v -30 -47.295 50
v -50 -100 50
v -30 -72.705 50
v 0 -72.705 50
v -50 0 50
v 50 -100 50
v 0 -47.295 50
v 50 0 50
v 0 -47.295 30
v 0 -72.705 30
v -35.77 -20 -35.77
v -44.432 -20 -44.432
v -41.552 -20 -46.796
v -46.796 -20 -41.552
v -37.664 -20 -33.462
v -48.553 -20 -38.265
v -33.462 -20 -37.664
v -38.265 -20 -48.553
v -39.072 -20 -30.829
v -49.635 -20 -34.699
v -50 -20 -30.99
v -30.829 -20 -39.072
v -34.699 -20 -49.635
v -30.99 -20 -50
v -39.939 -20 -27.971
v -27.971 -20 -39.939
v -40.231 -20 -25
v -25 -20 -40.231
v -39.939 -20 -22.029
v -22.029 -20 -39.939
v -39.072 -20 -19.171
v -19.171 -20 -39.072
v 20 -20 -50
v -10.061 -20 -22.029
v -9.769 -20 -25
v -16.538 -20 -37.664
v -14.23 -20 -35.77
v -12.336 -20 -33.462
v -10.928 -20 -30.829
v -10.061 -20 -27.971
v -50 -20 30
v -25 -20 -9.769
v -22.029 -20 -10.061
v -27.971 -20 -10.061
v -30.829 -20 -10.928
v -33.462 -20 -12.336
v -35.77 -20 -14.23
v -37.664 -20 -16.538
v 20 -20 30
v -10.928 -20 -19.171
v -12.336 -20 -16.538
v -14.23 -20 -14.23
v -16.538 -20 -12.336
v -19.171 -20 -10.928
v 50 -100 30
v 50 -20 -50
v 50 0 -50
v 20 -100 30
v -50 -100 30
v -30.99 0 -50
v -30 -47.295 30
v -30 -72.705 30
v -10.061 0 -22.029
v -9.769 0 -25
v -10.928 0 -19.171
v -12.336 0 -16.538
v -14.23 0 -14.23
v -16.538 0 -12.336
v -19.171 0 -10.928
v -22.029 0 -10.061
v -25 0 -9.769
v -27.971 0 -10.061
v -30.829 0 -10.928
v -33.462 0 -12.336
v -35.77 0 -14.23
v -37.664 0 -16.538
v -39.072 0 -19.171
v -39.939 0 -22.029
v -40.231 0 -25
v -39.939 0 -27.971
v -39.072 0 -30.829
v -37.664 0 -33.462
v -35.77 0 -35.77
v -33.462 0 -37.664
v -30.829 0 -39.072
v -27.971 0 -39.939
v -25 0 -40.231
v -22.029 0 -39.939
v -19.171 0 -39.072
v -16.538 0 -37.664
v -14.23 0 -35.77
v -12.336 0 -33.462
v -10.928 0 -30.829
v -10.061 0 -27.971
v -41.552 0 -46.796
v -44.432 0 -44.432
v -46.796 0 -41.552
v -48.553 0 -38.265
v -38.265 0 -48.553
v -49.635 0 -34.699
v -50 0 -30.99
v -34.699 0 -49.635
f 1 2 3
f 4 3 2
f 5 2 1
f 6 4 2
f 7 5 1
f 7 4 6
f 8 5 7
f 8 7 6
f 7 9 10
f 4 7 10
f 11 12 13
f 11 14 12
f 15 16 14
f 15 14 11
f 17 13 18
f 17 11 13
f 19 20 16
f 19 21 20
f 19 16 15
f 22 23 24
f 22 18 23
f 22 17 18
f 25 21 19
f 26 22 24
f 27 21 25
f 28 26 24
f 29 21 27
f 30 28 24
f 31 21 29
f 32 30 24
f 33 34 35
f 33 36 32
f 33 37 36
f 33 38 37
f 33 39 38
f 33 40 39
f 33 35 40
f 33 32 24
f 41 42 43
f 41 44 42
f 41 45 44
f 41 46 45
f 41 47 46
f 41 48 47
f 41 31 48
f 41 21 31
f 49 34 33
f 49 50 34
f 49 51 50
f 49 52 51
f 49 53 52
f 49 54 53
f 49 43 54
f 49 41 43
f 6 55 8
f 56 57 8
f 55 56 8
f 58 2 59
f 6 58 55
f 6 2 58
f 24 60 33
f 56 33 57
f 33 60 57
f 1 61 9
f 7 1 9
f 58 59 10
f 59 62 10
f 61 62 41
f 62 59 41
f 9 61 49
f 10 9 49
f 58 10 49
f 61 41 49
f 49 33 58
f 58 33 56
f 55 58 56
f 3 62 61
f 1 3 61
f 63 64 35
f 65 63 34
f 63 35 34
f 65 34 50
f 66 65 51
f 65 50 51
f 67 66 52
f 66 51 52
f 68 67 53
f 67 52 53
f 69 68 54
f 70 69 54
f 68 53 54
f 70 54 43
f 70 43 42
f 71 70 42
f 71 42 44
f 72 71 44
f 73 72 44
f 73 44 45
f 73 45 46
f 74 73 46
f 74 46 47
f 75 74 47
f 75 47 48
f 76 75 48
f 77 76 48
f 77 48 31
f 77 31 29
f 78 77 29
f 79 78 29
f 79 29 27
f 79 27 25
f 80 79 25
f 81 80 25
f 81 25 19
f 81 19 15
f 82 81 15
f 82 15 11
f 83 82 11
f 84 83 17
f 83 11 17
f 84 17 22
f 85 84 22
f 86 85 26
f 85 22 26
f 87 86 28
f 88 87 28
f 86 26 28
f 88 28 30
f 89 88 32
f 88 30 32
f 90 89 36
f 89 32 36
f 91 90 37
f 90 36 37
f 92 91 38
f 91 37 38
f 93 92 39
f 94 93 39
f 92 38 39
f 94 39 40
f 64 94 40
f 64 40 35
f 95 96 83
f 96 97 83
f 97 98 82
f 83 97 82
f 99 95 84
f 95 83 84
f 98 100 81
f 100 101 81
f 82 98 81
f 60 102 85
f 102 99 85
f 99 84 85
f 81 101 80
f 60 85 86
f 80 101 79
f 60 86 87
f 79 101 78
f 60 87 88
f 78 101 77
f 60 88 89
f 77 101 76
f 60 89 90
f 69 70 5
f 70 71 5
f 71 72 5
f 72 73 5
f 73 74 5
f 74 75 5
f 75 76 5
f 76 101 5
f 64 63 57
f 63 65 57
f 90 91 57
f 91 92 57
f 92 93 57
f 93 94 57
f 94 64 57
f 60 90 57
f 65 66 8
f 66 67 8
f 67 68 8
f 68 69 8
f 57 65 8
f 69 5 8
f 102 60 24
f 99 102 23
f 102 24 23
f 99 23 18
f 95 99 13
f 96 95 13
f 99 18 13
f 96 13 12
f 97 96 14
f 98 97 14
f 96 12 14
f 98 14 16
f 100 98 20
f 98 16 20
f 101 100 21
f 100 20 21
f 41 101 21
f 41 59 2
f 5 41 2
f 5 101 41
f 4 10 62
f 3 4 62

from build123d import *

# Parameters (mm, degrees)
F0_W      = 100
F0_H      = 100
F1_DEPTH  = 20
F2_W      = 100
F2_H      = 20
F3_DEPTH  = 80
F4_W      = 30
F4_H      = 80
F5_DEPTH  = 80
F6_SIZE2  = 80
F6_SIZE   = 80
F7_W      = 15
F7_H      = 12.7048021555
F8_DEPTH  = 127
F10_DEPTH = 1143
F11_R     = 15.2311965997
F12_DEPTH = 254
F13_R     = 19.0095175901


with BuildPart() as f1:
    # F0 (on Front) → F1 (new body)
    with BuildSketch(Plane.XZ):
        Rectangle(F0_W, F0_H)
    extrude(amount=F1_DEPTH)

    # F2 (on face) → F3 (join)
    with BuildSketch(Plane.XZ.offset(20)):
        with Locations((0, 40)):
            Rectangle(F2_W, F2_H)
    extrude(amount=F3_DEPTH)

    # F4 (on face) → F5 (join)
    with BuildSketch(Plane.XZ.offset(20)):
        with Locations((35, -10)):
            Rectangle(F4_W, F4_H)
    extrude(amount=F5_DEPTH)

    # F6
    f6_edges = [f1.edges().sort_by_distance(p)[0] for p in [
        (35, -100, -50),
    ]]
    chamfer(f6_edges, length=F6_SIZE, length2=F6_SIZE2)

    # F7 (on face) → F8 (cut)
    with BuildSketch(Plane(origin=(0, 0, 30), x_dir=(1, 0, 0), z_dir=(0, 0, -1))):
        with Locations((-22.5, 66.3524010777)):
            Rectangle(F7_W, F7_H)
        with Locations((-22.5, 53.6475989223)):
            Rectangle(F7_W, F7_H)
        with Locations((-7.5, 53.6475989223)):
            Rectangle(F7_W, F7_H)
        with Locations((-7.5, 66.3524010777)):
            Rectangle(F7_W, F7_H)
    extrude(amount=-F8_DEPTH, mode=Mode.SUBTRACT)

    # F9 (on face) → F10 (cut)
    with BuildSketch(Plane.XZ.offset(20)):
        with BuildLine():
            Line((-25, -25), (-40, -25))
            ThreePointArc((-40, -25), (-35.6066017178, -35.6066017178), (-25, -40))
            Line((-25, -40), (-25, -25))
        make_face()
    extrude(amount=-F10_DEPTH, mode=Mode.SUBTRACT)

    # F11 (on face) → F12 (cut)
    with BuildSketch(Plane.XZ.offset(20)):
        with Locations((-25, -25)):
            Circle(F11_R)
        with BuildLine():
            Line((-40, -25), (-25, -25))
            Line((-25, -25), (-25, -40))
            ThreePointArc((-25, -40), (-35.6066017178, -35.6066017178), (-40, -25))
        make_face(mode=Mode.SUBTRACT)
        with Locations((-25, -25)):
            Circle(F11_R)
    extrude(amount=-F12_DEPTH, mode=Mode.SUBTRACT)

    # F13
    f13_edges = [f1.edges().sort_by_distance(p)[0] for p in [
        (-50, -10, -50),
    ]]
    fillet(f13_edges, radius=F13_R)


solid = f1.part
